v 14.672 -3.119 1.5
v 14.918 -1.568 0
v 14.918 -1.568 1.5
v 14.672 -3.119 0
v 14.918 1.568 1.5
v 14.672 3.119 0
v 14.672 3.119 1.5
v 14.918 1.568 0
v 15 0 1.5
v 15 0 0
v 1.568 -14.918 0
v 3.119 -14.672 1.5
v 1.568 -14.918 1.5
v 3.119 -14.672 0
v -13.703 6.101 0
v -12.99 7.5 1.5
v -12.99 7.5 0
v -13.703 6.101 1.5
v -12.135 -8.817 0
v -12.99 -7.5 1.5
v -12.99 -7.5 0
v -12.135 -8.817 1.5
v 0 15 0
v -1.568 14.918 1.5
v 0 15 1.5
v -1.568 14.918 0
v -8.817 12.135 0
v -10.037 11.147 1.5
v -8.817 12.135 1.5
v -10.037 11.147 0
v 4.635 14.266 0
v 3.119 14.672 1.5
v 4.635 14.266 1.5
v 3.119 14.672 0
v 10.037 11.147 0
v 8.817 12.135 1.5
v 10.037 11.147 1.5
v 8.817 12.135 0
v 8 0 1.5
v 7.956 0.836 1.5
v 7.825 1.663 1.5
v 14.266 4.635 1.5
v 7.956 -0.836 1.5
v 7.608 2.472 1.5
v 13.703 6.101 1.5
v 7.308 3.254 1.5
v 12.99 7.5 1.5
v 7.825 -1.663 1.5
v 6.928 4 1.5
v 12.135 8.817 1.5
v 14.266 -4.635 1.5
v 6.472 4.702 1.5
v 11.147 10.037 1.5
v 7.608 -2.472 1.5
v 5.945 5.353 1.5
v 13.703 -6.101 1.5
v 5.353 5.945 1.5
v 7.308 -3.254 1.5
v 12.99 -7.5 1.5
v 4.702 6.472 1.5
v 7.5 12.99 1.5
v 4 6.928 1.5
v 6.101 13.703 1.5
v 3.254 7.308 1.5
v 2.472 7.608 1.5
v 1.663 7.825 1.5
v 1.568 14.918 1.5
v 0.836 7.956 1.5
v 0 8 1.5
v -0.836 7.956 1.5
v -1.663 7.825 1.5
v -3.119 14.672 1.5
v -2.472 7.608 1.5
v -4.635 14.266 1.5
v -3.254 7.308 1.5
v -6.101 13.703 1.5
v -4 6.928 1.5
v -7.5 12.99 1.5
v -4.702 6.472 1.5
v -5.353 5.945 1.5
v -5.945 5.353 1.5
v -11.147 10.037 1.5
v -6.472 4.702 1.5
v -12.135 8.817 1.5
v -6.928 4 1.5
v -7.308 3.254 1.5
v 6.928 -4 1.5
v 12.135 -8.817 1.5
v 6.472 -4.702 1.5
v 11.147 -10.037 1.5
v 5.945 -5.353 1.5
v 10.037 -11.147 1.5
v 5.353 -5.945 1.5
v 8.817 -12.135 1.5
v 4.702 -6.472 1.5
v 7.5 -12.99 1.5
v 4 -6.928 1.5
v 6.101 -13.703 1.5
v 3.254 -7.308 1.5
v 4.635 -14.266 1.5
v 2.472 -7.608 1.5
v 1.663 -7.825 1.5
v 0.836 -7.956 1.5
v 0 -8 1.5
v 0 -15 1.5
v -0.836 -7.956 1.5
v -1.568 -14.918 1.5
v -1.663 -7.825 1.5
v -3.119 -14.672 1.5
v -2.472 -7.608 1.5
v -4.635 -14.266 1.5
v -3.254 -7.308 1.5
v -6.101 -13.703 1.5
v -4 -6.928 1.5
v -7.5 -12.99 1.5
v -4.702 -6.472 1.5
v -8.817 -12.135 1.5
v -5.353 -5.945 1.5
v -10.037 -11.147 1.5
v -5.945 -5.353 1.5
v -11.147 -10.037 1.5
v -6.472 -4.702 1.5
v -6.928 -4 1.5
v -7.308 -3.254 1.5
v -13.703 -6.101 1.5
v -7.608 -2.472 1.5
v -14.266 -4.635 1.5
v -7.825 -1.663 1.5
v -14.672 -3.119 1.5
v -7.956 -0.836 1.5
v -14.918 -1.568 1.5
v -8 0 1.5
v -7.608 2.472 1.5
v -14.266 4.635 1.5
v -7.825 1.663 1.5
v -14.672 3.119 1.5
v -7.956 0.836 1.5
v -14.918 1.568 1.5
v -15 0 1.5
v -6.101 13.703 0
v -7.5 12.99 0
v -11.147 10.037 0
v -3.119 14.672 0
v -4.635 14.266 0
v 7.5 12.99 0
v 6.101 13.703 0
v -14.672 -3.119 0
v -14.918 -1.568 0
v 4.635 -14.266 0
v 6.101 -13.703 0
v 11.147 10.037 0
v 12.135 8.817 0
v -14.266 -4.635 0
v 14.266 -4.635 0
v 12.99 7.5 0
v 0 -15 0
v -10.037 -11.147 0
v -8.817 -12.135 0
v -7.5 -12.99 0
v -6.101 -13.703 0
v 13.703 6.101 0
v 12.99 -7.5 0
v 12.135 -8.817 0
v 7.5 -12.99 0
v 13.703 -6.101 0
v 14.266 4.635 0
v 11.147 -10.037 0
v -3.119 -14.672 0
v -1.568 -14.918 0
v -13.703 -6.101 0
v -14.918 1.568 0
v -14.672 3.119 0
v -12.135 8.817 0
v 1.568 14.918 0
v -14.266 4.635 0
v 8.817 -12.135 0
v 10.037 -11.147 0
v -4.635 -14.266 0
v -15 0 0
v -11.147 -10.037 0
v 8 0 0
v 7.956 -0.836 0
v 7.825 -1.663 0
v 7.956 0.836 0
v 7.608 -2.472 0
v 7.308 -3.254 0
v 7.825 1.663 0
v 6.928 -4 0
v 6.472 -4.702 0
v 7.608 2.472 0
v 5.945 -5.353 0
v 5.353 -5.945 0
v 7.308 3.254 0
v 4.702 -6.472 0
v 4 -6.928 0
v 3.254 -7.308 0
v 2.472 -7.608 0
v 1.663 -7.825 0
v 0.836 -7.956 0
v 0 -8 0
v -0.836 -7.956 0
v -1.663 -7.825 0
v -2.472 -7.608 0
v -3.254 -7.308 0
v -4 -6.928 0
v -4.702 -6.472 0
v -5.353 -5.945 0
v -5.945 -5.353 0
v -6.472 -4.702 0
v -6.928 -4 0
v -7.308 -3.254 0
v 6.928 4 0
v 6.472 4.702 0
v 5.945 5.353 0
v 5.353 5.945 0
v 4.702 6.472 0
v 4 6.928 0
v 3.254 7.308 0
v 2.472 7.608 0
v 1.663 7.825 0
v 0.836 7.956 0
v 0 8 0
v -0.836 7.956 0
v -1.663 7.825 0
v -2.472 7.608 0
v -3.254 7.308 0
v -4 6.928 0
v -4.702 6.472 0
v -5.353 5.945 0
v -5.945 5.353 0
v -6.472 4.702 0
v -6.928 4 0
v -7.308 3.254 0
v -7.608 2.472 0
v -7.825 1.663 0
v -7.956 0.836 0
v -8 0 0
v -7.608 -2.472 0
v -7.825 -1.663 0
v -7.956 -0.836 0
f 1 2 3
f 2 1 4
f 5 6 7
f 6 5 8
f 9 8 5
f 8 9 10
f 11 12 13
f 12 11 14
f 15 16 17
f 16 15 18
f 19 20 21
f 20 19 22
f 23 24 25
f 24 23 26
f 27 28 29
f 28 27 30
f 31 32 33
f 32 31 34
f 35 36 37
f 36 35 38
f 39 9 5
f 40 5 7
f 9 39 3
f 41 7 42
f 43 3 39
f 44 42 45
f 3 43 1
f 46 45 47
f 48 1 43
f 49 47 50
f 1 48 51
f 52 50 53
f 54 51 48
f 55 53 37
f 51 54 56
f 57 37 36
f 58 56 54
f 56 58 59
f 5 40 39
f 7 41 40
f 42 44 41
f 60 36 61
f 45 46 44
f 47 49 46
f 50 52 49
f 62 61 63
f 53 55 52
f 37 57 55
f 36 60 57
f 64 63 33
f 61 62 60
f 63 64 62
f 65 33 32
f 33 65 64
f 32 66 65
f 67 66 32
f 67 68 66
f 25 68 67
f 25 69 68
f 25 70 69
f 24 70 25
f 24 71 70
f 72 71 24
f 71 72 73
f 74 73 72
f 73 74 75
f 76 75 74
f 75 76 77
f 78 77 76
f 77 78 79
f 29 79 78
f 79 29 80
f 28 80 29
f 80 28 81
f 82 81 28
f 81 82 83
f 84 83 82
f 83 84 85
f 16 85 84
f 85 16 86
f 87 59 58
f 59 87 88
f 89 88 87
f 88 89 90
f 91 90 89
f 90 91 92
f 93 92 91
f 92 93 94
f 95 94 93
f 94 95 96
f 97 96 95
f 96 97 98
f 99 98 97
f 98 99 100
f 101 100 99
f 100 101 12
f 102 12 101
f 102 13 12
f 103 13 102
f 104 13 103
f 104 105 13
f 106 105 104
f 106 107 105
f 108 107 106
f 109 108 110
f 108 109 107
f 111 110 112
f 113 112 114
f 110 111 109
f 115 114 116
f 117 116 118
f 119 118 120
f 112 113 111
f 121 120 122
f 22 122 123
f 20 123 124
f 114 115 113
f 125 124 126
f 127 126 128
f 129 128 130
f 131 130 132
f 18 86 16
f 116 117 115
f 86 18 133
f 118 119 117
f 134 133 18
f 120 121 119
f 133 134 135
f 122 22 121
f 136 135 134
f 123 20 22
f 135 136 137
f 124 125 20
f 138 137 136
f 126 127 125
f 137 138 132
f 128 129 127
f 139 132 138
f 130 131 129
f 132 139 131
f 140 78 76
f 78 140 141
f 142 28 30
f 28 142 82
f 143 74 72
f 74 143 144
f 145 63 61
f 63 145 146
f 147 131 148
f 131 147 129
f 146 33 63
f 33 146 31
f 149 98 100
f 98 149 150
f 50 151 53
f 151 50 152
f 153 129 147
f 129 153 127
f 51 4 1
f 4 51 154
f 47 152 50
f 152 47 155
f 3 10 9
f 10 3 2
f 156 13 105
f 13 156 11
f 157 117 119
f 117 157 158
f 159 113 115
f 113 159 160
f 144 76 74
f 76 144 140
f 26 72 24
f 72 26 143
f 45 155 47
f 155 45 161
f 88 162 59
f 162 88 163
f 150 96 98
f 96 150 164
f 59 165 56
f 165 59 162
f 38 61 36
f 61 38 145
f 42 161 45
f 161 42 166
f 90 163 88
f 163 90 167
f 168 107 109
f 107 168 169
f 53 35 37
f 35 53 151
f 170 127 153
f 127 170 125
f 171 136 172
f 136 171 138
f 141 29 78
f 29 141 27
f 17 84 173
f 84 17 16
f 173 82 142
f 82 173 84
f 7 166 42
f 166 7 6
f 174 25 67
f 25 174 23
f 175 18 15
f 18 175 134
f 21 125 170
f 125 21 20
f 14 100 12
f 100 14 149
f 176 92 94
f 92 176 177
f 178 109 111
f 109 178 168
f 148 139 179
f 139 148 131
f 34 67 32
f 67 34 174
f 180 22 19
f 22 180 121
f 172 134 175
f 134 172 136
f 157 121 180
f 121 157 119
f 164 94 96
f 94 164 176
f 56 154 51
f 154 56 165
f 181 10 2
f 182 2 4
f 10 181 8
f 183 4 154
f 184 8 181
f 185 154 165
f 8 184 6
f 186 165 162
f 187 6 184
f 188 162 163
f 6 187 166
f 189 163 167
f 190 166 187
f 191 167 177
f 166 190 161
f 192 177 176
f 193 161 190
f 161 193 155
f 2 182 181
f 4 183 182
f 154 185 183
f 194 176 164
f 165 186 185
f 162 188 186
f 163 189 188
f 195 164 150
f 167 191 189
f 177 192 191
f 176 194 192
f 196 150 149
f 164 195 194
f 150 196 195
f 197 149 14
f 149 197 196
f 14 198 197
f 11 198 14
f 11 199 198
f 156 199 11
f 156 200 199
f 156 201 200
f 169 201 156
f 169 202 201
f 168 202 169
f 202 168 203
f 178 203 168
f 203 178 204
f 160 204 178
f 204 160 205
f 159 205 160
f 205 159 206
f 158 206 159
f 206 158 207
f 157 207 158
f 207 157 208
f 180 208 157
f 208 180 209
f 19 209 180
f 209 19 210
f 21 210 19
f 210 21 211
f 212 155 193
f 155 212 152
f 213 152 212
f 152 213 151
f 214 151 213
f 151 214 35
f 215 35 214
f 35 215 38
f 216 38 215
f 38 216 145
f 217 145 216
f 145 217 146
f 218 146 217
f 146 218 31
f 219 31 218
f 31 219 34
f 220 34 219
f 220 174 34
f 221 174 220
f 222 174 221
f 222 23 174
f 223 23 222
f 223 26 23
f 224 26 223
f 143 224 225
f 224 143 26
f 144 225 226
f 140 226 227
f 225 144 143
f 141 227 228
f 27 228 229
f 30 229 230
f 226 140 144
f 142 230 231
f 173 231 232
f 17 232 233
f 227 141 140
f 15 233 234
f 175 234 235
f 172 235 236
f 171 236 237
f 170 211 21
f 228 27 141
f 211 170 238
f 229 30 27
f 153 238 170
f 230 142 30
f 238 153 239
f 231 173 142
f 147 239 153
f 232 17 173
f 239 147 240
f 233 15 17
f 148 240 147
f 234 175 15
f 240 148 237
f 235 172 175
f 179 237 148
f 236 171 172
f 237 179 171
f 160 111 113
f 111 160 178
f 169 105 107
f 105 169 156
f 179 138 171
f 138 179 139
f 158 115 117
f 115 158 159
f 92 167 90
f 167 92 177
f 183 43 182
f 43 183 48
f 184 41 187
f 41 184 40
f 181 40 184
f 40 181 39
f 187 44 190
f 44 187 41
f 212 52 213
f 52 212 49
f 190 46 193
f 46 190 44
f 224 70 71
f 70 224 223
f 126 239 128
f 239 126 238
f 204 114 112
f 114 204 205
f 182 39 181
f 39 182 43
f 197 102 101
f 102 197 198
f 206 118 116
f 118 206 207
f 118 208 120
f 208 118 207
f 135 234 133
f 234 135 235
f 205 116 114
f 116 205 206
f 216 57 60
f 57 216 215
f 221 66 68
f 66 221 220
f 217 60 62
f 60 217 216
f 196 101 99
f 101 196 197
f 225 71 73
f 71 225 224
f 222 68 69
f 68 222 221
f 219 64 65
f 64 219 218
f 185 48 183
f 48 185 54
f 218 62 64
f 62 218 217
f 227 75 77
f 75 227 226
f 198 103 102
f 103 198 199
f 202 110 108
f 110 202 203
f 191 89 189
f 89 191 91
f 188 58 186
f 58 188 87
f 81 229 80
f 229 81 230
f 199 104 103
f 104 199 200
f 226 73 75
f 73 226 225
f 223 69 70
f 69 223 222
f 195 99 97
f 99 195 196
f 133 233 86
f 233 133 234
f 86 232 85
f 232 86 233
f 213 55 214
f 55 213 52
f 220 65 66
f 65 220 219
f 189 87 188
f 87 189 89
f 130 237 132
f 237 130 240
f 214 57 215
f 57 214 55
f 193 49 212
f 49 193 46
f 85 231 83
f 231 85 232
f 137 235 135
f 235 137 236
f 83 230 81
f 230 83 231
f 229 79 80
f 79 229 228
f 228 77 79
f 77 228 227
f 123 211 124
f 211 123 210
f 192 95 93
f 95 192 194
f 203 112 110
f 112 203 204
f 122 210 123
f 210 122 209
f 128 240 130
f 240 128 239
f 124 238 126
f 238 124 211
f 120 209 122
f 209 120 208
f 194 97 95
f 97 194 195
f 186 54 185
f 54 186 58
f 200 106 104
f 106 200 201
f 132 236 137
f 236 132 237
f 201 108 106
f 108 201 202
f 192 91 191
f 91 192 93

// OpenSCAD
// Precision shim ring.
$fn = 60;
eps = 0.02;
inner_d = 16;
outer_d = 30;
thickness = 1.5;
difference() {
    cylinder(d = outer_d, h = thickness);
    translate([0, 0, -eps]) cylinder(d = inner_d, h = thickness + 2 * eps);
}
